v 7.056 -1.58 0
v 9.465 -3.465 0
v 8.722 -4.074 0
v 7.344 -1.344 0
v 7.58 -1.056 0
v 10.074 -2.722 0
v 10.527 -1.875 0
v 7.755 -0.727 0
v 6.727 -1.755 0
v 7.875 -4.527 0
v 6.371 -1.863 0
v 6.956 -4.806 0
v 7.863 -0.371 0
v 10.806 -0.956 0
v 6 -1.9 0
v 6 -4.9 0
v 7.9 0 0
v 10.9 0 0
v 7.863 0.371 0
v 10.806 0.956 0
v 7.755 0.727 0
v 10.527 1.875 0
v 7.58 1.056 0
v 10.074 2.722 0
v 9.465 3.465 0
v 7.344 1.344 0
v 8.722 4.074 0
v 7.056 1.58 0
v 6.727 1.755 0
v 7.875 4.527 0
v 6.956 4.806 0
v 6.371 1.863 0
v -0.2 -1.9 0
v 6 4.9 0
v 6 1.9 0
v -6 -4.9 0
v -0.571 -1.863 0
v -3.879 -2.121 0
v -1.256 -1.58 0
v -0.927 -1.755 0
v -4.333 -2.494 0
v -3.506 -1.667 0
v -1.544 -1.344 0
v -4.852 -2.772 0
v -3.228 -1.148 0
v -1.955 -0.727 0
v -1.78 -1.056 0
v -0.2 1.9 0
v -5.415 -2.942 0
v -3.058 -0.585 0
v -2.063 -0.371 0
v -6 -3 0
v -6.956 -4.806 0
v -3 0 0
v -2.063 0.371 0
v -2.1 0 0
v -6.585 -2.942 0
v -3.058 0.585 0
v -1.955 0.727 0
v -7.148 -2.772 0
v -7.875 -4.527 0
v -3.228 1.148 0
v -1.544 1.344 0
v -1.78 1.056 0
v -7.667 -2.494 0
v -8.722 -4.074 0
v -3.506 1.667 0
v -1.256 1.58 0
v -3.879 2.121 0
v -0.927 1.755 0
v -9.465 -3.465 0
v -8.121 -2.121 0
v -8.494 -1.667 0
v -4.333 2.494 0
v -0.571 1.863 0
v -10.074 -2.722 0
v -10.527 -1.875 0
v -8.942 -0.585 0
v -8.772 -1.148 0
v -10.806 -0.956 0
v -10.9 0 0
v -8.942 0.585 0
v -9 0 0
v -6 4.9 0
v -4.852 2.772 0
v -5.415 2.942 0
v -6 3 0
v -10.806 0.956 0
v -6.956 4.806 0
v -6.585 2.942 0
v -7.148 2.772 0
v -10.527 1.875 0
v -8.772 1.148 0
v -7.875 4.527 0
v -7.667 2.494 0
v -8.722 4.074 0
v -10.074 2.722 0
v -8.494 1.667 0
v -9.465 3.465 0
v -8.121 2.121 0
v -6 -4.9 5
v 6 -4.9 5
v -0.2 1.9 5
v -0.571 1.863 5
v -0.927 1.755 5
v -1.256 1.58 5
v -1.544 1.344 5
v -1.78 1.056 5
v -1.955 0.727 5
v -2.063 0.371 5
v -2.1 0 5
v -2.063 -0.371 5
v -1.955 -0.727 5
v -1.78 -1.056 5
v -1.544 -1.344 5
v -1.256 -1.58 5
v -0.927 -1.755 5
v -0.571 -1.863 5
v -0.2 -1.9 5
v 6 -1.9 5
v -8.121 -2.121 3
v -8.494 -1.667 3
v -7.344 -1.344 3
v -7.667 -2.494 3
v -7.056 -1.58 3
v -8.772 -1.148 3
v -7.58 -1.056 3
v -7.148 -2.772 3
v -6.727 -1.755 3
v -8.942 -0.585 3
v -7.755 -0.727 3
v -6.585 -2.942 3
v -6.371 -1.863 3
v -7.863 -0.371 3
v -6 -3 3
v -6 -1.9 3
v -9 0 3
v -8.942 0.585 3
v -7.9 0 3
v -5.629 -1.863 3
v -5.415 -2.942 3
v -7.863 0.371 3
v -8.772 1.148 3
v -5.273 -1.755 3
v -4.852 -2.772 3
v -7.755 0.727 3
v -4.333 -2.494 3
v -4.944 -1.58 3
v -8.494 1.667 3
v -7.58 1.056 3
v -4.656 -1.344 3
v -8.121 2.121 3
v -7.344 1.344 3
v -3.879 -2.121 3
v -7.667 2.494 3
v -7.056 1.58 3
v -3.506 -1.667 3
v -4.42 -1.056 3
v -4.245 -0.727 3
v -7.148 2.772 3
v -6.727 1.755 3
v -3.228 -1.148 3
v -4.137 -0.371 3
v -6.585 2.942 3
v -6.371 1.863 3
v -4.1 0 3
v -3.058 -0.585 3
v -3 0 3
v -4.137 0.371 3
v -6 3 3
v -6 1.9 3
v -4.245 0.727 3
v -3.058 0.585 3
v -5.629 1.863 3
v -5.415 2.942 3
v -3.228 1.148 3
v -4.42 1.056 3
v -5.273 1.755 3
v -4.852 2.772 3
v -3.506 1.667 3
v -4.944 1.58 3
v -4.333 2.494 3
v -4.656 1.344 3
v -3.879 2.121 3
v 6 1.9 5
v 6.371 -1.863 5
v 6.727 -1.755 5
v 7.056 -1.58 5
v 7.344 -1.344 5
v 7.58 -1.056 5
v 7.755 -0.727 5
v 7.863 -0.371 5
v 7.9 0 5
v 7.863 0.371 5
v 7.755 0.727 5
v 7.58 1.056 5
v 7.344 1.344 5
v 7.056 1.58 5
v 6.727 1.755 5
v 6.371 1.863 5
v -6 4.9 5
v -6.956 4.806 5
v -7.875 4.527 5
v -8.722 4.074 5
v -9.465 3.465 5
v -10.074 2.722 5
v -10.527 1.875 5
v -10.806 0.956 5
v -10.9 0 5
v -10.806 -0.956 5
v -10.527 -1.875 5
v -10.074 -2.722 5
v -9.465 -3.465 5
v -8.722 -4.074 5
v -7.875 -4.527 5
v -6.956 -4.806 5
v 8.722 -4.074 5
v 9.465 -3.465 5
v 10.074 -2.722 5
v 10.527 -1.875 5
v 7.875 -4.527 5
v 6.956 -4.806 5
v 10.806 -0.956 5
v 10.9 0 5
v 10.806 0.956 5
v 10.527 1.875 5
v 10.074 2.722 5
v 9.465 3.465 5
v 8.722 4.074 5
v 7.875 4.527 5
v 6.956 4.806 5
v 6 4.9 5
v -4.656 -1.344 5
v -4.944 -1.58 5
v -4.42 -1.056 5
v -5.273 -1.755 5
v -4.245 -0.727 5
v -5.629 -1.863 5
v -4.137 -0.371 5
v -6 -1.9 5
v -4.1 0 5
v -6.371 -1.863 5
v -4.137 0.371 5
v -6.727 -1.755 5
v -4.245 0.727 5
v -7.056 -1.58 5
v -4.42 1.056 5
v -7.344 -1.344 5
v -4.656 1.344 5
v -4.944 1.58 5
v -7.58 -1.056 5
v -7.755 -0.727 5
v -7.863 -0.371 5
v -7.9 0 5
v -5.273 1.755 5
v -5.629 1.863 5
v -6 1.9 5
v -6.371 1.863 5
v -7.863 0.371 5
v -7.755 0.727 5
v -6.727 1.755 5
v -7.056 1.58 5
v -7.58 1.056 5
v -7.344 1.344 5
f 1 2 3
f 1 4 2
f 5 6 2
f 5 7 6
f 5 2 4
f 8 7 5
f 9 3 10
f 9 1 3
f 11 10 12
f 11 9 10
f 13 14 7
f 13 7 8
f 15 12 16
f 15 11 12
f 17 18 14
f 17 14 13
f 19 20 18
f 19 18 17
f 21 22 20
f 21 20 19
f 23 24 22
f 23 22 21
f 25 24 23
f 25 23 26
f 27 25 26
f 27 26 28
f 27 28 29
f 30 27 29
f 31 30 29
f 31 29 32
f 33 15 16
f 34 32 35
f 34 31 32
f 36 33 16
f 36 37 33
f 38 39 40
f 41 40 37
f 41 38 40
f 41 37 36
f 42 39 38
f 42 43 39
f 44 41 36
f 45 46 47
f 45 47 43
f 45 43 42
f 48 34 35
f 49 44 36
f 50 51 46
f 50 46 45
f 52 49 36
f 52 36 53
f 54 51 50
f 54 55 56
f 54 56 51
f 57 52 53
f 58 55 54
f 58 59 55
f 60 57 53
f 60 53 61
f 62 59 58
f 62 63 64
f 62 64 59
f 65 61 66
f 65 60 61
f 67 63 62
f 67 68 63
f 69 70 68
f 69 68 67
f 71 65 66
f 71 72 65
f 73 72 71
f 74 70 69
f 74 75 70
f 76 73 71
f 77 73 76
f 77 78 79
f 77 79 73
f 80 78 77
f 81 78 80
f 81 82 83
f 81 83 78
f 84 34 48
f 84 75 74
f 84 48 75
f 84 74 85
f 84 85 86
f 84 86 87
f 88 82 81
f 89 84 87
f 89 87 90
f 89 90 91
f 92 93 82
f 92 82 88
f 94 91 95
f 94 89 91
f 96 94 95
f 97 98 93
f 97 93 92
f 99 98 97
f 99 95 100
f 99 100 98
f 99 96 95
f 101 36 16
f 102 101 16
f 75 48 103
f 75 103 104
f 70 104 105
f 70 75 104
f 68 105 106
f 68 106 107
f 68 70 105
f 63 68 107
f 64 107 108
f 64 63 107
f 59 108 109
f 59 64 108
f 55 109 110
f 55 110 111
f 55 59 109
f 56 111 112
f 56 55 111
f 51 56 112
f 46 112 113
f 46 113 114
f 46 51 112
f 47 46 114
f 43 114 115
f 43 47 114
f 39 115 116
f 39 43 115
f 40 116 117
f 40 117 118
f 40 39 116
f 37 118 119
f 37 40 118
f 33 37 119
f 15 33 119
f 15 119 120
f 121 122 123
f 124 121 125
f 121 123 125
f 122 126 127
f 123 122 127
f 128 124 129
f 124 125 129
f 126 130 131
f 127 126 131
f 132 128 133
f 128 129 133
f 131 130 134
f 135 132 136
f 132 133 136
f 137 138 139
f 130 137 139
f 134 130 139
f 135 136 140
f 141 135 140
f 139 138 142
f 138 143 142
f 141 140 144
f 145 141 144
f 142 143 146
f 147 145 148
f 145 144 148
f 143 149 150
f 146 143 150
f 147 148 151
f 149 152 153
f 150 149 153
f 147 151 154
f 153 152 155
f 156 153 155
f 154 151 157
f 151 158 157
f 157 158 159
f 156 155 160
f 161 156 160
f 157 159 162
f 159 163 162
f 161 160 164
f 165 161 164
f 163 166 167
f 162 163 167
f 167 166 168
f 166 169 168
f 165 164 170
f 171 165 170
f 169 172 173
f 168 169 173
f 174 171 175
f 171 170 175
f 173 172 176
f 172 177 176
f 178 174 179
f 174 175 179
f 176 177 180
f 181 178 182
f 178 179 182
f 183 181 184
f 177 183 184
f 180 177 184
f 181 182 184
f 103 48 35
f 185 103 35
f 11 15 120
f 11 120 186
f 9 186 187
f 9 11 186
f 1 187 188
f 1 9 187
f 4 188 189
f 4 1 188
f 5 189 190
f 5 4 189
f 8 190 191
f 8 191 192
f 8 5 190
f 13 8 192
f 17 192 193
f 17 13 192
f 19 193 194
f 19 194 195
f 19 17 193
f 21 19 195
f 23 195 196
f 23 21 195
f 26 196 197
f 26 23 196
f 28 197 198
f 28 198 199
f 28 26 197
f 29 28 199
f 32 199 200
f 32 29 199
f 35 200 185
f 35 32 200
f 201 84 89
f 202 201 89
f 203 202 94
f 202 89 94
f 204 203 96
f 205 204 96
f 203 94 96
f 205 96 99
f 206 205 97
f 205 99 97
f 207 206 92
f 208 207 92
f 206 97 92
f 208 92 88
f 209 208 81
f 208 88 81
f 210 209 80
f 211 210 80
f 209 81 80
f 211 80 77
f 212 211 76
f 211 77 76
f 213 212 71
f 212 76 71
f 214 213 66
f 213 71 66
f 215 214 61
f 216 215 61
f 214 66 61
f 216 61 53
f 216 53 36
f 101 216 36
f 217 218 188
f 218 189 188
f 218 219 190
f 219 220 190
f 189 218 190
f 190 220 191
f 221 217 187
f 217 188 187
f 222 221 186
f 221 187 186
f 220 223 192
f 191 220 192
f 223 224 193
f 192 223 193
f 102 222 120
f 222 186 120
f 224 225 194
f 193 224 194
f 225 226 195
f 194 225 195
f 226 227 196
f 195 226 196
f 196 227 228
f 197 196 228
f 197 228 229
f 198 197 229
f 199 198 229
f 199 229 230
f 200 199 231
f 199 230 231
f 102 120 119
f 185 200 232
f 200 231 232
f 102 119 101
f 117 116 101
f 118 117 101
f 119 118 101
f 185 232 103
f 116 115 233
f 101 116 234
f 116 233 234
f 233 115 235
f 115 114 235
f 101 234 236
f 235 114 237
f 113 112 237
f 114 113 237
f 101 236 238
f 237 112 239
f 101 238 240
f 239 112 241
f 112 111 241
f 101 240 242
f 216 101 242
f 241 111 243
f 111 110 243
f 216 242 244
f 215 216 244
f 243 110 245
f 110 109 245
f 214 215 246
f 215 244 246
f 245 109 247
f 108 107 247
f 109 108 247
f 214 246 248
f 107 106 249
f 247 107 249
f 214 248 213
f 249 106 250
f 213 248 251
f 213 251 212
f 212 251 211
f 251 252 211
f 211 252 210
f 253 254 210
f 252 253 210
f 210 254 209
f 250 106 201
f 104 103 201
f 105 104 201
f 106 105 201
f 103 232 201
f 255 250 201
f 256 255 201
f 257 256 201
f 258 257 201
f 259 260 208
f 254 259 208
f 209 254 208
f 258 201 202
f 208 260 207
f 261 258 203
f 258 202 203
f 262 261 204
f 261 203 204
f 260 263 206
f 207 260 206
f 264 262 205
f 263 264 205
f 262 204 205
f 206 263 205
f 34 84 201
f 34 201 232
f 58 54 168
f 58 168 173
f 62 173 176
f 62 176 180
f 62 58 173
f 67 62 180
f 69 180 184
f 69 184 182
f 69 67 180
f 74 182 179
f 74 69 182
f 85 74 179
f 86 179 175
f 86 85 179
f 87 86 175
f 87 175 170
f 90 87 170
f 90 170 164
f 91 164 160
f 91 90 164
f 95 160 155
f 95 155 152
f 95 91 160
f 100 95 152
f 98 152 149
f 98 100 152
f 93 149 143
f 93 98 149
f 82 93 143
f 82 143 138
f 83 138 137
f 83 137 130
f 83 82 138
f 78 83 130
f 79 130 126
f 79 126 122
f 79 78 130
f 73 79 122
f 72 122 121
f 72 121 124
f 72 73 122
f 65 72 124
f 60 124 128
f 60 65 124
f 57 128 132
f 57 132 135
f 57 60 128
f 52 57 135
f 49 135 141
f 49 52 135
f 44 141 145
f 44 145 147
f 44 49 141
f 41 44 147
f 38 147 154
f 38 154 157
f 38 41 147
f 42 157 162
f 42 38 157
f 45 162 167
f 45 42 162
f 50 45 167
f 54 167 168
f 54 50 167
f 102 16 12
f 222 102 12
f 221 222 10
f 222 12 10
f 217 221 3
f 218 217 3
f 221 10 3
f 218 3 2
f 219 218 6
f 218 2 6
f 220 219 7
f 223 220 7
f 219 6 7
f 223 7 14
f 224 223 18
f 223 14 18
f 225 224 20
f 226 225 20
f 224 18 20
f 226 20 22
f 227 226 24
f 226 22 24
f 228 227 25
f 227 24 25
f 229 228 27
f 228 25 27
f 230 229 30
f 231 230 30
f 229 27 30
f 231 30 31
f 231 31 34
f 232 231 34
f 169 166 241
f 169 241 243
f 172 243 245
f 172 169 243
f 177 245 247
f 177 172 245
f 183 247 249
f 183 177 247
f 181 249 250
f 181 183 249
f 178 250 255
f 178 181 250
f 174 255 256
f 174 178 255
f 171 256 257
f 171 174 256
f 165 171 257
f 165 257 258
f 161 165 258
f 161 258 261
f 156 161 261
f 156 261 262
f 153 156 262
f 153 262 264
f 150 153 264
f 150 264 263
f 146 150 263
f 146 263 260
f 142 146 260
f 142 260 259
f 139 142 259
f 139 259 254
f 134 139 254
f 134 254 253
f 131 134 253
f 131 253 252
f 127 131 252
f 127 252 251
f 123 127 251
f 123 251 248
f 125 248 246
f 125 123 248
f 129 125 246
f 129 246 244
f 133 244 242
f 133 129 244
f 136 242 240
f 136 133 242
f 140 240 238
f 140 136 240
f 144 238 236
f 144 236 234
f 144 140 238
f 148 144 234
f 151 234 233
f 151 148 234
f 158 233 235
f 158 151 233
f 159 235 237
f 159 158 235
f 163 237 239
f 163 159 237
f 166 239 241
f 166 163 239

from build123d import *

# Parameters (mm, degrees)
CYLINDER_R     = 3
CYLINDER_DEPTH = 3
SKETCH_R       = 1.9
PAD_DEPTH      = 5


with BuildPart() as cylinder:
    # Cylinder → Cylinder (new body)
    with BuildSketch(Plane(origin=(-6, 0, 0), x_dir=(1, 0, 0), z_dir=(0, 0, 1))):
        Circle(CYLINDER_R)
    extrude(amount=CYLINDER_DEPTH)


with BuildPart() as attach_cut:
    # Sketch → Pad (new body)
    with BuildSketch(Plane.XY):
        with BuildLine():
            Line((-6, 4.9), (6, 4.9))
            ThreePointArc((6, -4.9), (10.9, 0), (6, 4.9))
            Line((-6, -4.9), (6, -4.9))
            ThreePointArc((-6, 4.9), (-10.9, 0), (-6, -4.9))
        make_face()
        with Locations((-6, 0)):
            Circle(SKETCH_R, mode=Mode.SUBTRACT)
        with BuildLine():
            Line((-0.2, 1.9), (6, 1.9))
            ThreePointArc((6, -1.9), (7.9, 0), (6, 1.9))
            Line((-0.2, -1.9), (6, -1.9))
            ThreePointArc((-0.2, 1.9), (-2.1, 0), (-0.2, -1.9))
        make_face(mode=Mode.SUBTRACT)
    extrude(amount=PAD_DEPTH)

    # Cut: cut Cylinder
    add(cylinder.part, mode=Mode.SUBTRACT)


solid = attach_cut.part
